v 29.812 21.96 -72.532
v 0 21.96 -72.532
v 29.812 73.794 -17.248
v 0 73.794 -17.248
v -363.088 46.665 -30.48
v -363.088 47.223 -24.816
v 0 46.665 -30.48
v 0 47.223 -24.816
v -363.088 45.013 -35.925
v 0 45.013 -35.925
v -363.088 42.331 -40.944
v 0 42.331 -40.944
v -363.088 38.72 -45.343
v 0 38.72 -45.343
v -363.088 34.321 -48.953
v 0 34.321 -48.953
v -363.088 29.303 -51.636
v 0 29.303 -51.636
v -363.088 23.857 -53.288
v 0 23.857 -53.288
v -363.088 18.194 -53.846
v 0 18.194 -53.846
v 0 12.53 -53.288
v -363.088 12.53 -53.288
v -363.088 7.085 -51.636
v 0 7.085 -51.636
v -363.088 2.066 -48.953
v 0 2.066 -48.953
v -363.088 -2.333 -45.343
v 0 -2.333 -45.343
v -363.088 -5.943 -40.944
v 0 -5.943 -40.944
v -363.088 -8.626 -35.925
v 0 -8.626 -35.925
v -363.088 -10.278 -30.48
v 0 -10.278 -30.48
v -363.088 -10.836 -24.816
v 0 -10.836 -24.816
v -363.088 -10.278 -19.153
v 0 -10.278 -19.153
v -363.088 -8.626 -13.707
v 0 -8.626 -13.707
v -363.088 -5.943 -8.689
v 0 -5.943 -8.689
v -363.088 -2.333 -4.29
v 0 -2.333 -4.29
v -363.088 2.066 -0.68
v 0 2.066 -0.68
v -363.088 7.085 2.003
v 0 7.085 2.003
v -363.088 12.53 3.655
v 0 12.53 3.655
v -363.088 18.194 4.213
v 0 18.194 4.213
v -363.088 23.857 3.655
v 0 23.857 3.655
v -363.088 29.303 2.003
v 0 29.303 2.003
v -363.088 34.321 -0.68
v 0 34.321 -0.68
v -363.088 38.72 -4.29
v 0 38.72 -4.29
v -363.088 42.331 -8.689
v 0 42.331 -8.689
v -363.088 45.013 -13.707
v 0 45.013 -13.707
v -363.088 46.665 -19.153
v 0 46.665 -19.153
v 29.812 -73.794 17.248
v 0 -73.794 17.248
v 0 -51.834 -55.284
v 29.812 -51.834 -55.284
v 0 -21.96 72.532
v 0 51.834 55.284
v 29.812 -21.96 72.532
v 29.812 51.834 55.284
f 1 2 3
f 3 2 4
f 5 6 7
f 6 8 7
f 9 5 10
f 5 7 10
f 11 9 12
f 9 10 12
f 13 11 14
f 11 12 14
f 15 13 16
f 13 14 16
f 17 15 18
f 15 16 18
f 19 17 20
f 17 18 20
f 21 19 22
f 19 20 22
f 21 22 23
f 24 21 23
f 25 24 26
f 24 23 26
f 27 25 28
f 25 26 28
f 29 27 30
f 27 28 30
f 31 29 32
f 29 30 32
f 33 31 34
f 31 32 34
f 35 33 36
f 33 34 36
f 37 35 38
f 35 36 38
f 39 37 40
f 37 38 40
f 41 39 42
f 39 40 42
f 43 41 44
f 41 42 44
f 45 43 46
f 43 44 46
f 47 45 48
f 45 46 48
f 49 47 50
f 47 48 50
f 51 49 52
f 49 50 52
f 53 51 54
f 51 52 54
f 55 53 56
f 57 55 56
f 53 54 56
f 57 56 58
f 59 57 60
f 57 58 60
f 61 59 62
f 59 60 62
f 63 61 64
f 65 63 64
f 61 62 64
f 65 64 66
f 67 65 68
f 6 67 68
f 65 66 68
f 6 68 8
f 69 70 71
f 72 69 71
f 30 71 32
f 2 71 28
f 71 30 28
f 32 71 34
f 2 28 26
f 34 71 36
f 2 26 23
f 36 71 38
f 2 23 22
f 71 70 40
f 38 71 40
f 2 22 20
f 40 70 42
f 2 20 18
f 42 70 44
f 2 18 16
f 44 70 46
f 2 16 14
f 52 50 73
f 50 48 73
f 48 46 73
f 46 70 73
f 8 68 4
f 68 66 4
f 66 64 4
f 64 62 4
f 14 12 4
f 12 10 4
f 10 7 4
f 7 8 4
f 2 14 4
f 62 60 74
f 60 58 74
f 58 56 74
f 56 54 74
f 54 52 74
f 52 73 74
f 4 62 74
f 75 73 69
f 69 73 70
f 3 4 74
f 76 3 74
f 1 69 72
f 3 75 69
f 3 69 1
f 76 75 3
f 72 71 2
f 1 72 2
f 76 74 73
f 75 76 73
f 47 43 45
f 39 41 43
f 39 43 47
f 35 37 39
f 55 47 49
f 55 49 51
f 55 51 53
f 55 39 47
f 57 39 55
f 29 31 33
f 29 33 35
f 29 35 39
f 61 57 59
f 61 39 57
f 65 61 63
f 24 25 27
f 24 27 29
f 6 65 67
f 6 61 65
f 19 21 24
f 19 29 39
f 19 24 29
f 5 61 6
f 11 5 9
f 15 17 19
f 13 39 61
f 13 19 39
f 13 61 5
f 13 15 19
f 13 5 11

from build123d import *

# Parameters (mm, degrees)
F1_DEPTH  = 29.811595
F2_R      = 29.029184
F3_DEPTH  = 71.004875
F3_FACE_R = 29.029184
F4_DEPTH  = 292.082846


with BuildPart() as f1:
    # F0 (on Right) → F1 (new body)
    with BuildSketch(Plane.YZ):
        Polygon((-73.794099, 17.247879), (-51.834151, -55.283625), (21.959948, -72.531504), (73.794099, -17.247879), (51.834151, 55.283625), (-21.959948, 72.531504), align=None)
    extrude(amount=F1_DEPTH)

    # F2 (on Right) → F3 (join)
    with BuildSketch(Plane.YZ):
        with Locations((18.193632, -24.816409)):
            Circle(F2_R)
    extrude(amount=-F3_DEPTH)

    # F3_face (on face) → F4 (join)
    with BuildSketch(Plane(origin=(-71.004875, 18.193632, -24.816409), x_dir=(0, 1, 0), z_dir=(-1, 0, 0))):
        Circle(F3_FACE_R)
    extrude(amount=F4_DEPTH)


solid = f1.part
